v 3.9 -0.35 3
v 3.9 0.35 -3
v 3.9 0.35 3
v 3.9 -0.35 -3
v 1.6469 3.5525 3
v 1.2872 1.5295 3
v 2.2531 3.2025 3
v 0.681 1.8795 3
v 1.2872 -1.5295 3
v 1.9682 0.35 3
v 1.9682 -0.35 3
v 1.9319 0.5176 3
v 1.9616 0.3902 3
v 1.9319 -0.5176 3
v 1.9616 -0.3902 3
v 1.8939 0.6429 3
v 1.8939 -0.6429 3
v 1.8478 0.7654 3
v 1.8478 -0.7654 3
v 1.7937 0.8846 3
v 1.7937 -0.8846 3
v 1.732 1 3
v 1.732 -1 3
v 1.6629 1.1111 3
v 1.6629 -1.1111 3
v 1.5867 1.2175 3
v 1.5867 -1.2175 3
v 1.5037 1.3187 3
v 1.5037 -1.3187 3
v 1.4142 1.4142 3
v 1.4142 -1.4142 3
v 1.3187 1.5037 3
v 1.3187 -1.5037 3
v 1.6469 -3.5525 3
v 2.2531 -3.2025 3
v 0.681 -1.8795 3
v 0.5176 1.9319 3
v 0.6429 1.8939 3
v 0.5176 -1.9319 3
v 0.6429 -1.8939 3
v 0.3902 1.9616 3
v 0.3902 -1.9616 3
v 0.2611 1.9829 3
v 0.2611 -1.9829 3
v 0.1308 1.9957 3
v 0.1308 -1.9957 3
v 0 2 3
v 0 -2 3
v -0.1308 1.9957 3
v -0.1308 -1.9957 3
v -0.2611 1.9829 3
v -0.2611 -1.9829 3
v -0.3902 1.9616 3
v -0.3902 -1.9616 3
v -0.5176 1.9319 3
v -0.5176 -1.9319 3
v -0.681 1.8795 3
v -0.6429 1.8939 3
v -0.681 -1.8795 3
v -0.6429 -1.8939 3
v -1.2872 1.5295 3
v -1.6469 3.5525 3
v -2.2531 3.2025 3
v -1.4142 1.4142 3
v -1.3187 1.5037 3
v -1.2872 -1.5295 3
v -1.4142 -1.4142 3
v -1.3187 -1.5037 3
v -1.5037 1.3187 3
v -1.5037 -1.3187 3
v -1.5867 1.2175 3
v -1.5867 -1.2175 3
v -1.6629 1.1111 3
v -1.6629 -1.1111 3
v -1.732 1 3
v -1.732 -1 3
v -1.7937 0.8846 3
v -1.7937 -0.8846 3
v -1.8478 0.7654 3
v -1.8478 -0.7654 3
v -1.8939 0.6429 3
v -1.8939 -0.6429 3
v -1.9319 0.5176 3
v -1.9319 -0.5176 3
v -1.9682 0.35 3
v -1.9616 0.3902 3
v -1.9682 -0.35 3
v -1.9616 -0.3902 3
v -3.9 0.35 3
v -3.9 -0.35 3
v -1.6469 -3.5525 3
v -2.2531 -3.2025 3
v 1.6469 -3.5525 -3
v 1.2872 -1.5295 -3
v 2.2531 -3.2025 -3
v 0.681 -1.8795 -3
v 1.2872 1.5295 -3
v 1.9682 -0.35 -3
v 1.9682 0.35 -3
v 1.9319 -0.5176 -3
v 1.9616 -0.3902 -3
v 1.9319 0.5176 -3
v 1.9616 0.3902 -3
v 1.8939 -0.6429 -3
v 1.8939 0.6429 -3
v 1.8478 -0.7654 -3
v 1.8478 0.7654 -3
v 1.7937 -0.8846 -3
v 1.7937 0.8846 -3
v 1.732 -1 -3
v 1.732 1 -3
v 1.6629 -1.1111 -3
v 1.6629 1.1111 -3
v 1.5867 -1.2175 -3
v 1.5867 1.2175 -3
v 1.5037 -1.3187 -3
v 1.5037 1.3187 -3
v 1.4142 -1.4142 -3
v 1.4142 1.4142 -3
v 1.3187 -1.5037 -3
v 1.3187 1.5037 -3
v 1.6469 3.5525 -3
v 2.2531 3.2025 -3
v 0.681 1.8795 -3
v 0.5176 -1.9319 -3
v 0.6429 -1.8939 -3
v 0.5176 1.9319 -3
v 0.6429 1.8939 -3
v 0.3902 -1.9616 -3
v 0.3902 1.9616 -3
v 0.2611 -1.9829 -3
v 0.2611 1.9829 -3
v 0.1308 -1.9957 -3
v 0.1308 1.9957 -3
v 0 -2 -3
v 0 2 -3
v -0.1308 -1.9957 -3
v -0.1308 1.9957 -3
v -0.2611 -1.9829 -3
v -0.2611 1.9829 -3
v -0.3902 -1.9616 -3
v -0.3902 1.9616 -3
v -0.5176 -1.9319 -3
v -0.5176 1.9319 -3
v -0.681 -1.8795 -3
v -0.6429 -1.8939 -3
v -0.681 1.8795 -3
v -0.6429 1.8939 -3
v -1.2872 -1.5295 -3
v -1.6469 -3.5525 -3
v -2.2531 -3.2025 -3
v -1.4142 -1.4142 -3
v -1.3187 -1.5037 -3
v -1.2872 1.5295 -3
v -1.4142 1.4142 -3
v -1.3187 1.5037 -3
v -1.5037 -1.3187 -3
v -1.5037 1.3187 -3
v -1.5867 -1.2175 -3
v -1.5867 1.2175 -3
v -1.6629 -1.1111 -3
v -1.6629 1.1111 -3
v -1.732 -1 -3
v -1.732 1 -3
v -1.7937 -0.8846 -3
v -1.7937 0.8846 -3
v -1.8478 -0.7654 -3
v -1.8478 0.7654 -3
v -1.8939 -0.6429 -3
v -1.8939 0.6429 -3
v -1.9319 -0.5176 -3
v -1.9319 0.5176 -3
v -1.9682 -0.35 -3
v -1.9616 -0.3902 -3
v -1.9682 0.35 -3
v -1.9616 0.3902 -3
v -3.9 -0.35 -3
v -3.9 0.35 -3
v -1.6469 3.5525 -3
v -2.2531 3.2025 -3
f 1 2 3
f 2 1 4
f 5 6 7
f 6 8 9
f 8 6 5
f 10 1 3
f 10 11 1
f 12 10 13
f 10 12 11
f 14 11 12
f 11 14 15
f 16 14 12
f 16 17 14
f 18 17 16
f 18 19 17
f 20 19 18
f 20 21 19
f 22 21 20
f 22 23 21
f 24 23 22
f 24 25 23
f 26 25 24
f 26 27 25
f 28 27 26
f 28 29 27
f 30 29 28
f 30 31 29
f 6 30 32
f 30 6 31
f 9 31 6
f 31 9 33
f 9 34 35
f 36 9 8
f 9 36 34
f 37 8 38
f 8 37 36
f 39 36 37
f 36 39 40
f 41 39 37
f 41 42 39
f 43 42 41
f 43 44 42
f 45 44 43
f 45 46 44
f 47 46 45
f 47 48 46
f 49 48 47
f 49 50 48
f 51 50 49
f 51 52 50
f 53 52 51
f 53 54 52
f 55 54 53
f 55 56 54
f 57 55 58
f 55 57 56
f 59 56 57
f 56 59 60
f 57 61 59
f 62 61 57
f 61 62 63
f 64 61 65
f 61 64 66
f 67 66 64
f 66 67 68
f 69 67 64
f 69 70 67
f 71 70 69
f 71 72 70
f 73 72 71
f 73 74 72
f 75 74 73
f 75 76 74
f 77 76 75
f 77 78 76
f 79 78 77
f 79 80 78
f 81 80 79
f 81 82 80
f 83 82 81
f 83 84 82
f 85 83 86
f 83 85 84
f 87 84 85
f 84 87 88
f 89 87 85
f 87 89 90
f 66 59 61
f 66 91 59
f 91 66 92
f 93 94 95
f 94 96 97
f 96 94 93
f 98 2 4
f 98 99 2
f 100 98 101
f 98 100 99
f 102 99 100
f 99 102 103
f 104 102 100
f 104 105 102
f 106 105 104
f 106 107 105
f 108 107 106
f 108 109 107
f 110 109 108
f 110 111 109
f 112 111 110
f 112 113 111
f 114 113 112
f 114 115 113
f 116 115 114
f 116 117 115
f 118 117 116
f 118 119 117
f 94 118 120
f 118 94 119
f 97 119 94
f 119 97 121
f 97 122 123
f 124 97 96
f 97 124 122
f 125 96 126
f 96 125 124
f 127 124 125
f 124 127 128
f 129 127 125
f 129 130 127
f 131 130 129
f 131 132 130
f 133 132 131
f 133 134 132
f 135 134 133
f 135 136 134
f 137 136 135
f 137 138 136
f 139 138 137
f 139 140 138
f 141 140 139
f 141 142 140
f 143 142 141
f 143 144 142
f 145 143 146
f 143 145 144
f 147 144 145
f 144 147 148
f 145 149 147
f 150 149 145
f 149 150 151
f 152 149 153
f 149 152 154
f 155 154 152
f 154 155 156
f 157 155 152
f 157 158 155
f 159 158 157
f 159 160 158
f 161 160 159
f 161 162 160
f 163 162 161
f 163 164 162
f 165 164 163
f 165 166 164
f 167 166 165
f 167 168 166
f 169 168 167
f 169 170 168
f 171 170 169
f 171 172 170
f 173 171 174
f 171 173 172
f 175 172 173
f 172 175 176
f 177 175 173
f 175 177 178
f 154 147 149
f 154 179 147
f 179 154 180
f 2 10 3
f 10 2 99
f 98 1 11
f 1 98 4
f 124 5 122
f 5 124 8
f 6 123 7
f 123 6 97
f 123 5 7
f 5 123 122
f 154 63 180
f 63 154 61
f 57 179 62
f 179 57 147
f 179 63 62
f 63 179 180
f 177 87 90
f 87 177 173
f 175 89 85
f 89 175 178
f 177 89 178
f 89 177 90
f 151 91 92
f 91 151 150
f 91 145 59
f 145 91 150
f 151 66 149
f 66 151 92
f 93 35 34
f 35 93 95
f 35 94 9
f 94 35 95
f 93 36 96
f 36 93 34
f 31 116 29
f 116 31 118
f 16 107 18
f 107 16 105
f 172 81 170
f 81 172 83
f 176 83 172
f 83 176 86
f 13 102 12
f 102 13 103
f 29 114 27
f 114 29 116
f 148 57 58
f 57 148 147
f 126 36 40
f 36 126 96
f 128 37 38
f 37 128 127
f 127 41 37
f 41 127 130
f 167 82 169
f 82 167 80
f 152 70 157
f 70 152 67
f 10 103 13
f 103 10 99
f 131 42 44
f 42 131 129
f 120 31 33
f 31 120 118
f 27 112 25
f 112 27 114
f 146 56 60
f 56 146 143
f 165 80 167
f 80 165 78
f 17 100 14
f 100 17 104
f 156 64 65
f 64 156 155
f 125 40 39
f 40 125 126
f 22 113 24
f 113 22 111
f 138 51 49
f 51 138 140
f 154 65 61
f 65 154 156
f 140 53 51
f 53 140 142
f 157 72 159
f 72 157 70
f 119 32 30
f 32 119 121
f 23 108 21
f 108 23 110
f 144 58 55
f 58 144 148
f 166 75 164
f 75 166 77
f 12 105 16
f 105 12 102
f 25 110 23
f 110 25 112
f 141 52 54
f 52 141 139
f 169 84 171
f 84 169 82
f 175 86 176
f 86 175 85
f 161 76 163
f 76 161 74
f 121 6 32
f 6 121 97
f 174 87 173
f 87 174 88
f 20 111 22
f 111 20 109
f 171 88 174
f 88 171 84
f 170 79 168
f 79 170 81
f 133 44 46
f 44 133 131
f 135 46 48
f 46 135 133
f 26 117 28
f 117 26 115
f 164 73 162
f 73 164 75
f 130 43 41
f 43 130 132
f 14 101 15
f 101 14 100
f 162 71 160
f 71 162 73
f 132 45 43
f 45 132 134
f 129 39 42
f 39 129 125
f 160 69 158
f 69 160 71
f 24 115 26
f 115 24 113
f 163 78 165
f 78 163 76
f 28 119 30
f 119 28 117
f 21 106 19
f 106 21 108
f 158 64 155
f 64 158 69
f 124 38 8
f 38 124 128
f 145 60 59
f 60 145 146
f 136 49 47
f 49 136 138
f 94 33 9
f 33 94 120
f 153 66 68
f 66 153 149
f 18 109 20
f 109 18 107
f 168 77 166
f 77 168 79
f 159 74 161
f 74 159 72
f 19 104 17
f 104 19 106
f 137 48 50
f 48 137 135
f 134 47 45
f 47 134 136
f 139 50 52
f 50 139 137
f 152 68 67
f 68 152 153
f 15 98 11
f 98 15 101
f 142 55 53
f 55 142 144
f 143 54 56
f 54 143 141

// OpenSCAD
// Parameters
radius = 2.0; //[1:4:0.1]
angle_deg = 0; //[-180:180:1]
height = 6; //[3:12:0.5]

// Radial settings (6-fold)
num_radial = 6;

// Detail
$fn = 96;

// Geometry
module radial_component(r=radius, h=height, n=num_radial) {
    hub_r = r;
    hub_h = h;

    // Arms: ensure clear 6-fold symmetry and solid connectivity
    arm_len  = r * 1.10;                 // protrusion beyond hub
    arm_w    = max(0.35, r * 0.35);      // arm thickness
    overlap  = min(0.30, r * 0.20);      // overlap into hub for guaranteed union

    union() {
        // Hub
        cylinder(h=hub_h, r=hub_r, center=true);

        // 6 radial arms (consistent in all orthographic views)
        for (i = [0:n-1]) {
            rotate([0, 0, i * 360 / n + angle_deg])
                translate([hub_r + arm_len/2 - overlap, 0, 0])
                    cube([arm_len, arm_w, hub_h], center=true);
        }
    }
}

// Build (angle applied inside to avoid double-rotation ambiguity)
radial_component();
